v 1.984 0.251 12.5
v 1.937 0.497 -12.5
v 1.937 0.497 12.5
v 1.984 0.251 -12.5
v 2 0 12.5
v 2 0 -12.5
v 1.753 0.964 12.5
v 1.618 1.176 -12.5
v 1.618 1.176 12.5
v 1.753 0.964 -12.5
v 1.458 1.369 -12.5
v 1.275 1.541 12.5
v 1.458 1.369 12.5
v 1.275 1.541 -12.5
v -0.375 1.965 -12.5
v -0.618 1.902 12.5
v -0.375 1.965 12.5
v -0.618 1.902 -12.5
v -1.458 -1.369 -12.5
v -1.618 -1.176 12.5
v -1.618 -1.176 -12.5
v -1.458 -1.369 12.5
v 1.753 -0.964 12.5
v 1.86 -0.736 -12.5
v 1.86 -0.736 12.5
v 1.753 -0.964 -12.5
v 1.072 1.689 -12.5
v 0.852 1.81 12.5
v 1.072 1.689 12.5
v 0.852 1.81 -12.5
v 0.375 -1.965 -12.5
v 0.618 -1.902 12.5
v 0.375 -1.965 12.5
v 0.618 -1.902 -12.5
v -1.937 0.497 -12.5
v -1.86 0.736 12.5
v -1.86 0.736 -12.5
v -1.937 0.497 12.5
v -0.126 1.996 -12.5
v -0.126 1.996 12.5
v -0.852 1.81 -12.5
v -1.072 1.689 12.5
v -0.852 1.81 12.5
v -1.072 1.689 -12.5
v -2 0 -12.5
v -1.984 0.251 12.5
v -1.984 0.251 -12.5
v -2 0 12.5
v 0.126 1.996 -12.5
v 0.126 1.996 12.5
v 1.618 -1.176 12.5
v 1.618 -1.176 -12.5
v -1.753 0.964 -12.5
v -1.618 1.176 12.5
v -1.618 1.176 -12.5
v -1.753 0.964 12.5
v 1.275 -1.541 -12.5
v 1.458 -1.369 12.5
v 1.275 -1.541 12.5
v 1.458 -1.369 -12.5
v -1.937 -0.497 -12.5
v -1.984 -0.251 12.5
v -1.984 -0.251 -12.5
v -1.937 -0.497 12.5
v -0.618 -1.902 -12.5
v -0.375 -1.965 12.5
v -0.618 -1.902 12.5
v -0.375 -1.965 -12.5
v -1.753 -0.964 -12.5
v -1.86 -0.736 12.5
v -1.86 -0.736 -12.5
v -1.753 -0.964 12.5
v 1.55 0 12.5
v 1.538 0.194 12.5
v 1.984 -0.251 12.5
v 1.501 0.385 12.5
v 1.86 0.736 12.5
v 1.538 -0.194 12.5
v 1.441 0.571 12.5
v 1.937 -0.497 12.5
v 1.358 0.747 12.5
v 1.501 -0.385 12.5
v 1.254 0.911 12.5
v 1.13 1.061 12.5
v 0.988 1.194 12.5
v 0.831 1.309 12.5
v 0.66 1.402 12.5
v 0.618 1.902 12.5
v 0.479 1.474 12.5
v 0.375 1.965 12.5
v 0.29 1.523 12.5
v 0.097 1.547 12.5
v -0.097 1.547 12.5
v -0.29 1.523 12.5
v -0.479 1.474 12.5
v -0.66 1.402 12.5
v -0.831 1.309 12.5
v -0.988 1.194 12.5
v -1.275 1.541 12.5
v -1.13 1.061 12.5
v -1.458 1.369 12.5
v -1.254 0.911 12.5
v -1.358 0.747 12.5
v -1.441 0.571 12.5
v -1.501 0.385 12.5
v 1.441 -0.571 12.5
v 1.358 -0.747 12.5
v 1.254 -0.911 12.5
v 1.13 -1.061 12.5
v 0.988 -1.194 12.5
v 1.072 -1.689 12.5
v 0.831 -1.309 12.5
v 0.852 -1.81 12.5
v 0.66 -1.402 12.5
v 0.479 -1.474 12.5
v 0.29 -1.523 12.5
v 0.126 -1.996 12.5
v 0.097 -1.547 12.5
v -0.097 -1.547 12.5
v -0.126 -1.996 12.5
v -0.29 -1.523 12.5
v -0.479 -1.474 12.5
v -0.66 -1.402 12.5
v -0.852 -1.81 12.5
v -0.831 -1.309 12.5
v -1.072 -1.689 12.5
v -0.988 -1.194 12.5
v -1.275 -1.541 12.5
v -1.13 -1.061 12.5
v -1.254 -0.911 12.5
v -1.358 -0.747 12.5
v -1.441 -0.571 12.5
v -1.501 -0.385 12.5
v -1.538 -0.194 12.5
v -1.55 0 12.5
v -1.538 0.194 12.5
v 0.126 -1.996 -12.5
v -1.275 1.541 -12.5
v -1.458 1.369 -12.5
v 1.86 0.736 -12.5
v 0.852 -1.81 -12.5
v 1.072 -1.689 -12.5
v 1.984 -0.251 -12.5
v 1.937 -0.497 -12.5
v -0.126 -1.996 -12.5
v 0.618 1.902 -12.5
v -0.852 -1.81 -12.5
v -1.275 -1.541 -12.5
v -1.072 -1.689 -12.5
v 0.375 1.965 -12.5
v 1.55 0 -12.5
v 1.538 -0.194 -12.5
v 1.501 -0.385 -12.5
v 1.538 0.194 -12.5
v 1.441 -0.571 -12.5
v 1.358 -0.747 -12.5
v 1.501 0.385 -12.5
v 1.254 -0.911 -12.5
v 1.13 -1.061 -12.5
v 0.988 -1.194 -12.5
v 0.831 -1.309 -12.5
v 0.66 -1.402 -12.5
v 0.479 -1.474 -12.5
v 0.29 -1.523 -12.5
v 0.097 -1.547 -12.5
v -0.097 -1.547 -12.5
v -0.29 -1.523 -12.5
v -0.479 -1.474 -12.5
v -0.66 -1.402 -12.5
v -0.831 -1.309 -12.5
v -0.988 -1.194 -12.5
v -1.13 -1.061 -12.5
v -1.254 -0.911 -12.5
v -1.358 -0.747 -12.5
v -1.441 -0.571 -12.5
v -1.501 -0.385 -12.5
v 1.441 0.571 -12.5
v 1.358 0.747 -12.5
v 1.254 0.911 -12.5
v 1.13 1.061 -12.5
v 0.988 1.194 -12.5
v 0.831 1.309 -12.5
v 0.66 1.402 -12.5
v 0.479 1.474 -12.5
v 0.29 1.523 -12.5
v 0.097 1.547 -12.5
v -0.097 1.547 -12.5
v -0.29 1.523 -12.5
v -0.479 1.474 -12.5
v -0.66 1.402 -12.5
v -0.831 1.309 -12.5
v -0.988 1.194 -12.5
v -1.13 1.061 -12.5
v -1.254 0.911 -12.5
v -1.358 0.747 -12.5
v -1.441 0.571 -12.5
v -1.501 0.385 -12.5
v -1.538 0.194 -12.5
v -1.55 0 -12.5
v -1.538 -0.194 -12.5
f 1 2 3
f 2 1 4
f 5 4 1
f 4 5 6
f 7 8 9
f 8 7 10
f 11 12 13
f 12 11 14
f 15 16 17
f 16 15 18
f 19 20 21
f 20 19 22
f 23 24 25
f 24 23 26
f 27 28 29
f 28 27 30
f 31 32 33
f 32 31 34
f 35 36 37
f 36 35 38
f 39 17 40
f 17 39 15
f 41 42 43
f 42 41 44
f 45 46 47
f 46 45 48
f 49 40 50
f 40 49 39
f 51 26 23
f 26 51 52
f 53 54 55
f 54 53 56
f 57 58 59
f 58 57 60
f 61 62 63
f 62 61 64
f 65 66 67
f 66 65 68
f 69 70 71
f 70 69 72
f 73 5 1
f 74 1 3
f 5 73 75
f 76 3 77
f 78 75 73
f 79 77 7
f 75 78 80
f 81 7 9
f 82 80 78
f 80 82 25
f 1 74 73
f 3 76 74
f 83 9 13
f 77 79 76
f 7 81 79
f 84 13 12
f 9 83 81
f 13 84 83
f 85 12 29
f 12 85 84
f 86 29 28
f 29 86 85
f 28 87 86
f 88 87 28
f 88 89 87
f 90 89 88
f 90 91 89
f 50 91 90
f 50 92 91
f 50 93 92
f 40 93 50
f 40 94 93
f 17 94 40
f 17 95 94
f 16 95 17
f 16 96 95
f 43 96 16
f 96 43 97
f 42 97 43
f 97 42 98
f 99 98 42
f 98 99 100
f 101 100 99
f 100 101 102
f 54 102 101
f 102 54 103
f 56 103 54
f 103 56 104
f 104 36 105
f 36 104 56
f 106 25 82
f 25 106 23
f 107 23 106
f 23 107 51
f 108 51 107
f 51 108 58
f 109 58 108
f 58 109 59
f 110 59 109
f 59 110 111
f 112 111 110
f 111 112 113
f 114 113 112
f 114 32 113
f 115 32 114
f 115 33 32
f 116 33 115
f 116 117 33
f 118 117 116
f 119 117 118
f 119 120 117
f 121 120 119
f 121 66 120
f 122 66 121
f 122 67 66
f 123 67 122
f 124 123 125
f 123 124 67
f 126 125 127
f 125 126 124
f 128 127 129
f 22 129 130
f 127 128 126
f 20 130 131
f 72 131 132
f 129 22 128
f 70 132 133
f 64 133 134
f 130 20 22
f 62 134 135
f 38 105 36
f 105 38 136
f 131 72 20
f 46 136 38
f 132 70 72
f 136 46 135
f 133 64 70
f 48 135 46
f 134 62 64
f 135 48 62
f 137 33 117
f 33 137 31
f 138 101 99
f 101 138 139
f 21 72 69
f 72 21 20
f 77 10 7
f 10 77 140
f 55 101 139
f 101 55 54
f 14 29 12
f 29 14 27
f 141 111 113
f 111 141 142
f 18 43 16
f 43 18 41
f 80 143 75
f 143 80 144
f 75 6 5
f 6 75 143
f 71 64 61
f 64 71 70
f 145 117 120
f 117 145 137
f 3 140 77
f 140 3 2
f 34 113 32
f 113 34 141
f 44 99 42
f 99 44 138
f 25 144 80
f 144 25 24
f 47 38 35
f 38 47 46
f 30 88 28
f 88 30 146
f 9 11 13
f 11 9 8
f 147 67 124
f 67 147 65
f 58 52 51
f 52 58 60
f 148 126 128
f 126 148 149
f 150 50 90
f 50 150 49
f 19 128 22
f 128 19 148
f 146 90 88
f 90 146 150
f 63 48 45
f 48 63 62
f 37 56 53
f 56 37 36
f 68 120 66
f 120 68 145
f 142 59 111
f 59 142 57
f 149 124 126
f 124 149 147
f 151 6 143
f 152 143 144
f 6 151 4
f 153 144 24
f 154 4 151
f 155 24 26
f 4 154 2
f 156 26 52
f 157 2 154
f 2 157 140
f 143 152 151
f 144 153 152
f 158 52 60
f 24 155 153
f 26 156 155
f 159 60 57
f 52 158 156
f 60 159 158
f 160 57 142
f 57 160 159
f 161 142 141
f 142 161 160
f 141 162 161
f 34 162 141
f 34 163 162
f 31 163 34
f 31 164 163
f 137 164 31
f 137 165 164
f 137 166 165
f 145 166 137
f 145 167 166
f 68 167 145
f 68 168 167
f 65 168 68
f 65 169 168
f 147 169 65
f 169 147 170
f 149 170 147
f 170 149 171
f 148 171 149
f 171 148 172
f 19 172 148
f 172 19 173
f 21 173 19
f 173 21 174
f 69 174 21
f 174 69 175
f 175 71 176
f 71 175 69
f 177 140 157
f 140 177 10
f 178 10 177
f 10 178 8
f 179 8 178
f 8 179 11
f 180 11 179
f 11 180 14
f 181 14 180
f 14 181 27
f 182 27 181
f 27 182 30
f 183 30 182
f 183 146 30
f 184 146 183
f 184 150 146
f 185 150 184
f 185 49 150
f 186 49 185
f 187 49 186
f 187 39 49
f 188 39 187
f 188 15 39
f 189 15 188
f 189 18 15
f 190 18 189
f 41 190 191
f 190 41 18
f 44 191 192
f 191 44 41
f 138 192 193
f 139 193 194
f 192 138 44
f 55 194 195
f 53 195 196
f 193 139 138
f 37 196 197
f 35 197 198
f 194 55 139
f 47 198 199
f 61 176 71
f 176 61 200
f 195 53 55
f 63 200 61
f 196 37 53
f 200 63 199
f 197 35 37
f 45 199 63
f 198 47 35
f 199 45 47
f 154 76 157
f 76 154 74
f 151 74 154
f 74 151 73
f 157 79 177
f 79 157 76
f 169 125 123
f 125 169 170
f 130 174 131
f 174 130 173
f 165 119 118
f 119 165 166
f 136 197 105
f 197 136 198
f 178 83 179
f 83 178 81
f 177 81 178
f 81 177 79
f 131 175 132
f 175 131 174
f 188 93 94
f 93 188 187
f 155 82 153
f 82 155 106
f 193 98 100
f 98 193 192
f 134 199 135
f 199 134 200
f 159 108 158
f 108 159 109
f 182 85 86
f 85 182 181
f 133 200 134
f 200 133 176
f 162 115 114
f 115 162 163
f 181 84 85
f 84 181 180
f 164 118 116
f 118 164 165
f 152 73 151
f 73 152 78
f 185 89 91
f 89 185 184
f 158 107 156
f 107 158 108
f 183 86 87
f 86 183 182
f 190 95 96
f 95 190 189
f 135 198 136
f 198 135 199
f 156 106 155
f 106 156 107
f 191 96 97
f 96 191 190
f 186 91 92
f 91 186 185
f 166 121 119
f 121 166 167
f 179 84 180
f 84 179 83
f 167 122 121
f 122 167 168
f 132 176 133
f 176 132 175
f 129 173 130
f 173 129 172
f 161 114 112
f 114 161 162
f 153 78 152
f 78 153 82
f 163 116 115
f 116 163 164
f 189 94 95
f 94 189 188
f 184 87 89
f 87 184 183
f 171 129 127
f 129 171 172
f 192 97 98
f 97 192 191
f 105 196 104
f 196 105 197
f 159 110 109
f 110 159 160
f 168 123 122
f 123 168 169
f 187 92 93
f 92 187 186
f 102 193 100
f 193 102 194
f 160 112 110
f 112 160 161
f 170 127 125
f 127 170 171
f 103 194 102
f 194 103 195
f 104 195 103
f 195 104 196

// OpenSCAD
$fn = 50;


difference() {
	union() {
		translate(v = [0, 0, -12.5000000000]) {
			cylinder(h = 25, r = 2.0000000000);
		}
	}
	union() {
		translate(v = [0, 0, -100.0000000000]) {
			cylinder(h = 200, r = 1.5500000000);
		}
	}
}
